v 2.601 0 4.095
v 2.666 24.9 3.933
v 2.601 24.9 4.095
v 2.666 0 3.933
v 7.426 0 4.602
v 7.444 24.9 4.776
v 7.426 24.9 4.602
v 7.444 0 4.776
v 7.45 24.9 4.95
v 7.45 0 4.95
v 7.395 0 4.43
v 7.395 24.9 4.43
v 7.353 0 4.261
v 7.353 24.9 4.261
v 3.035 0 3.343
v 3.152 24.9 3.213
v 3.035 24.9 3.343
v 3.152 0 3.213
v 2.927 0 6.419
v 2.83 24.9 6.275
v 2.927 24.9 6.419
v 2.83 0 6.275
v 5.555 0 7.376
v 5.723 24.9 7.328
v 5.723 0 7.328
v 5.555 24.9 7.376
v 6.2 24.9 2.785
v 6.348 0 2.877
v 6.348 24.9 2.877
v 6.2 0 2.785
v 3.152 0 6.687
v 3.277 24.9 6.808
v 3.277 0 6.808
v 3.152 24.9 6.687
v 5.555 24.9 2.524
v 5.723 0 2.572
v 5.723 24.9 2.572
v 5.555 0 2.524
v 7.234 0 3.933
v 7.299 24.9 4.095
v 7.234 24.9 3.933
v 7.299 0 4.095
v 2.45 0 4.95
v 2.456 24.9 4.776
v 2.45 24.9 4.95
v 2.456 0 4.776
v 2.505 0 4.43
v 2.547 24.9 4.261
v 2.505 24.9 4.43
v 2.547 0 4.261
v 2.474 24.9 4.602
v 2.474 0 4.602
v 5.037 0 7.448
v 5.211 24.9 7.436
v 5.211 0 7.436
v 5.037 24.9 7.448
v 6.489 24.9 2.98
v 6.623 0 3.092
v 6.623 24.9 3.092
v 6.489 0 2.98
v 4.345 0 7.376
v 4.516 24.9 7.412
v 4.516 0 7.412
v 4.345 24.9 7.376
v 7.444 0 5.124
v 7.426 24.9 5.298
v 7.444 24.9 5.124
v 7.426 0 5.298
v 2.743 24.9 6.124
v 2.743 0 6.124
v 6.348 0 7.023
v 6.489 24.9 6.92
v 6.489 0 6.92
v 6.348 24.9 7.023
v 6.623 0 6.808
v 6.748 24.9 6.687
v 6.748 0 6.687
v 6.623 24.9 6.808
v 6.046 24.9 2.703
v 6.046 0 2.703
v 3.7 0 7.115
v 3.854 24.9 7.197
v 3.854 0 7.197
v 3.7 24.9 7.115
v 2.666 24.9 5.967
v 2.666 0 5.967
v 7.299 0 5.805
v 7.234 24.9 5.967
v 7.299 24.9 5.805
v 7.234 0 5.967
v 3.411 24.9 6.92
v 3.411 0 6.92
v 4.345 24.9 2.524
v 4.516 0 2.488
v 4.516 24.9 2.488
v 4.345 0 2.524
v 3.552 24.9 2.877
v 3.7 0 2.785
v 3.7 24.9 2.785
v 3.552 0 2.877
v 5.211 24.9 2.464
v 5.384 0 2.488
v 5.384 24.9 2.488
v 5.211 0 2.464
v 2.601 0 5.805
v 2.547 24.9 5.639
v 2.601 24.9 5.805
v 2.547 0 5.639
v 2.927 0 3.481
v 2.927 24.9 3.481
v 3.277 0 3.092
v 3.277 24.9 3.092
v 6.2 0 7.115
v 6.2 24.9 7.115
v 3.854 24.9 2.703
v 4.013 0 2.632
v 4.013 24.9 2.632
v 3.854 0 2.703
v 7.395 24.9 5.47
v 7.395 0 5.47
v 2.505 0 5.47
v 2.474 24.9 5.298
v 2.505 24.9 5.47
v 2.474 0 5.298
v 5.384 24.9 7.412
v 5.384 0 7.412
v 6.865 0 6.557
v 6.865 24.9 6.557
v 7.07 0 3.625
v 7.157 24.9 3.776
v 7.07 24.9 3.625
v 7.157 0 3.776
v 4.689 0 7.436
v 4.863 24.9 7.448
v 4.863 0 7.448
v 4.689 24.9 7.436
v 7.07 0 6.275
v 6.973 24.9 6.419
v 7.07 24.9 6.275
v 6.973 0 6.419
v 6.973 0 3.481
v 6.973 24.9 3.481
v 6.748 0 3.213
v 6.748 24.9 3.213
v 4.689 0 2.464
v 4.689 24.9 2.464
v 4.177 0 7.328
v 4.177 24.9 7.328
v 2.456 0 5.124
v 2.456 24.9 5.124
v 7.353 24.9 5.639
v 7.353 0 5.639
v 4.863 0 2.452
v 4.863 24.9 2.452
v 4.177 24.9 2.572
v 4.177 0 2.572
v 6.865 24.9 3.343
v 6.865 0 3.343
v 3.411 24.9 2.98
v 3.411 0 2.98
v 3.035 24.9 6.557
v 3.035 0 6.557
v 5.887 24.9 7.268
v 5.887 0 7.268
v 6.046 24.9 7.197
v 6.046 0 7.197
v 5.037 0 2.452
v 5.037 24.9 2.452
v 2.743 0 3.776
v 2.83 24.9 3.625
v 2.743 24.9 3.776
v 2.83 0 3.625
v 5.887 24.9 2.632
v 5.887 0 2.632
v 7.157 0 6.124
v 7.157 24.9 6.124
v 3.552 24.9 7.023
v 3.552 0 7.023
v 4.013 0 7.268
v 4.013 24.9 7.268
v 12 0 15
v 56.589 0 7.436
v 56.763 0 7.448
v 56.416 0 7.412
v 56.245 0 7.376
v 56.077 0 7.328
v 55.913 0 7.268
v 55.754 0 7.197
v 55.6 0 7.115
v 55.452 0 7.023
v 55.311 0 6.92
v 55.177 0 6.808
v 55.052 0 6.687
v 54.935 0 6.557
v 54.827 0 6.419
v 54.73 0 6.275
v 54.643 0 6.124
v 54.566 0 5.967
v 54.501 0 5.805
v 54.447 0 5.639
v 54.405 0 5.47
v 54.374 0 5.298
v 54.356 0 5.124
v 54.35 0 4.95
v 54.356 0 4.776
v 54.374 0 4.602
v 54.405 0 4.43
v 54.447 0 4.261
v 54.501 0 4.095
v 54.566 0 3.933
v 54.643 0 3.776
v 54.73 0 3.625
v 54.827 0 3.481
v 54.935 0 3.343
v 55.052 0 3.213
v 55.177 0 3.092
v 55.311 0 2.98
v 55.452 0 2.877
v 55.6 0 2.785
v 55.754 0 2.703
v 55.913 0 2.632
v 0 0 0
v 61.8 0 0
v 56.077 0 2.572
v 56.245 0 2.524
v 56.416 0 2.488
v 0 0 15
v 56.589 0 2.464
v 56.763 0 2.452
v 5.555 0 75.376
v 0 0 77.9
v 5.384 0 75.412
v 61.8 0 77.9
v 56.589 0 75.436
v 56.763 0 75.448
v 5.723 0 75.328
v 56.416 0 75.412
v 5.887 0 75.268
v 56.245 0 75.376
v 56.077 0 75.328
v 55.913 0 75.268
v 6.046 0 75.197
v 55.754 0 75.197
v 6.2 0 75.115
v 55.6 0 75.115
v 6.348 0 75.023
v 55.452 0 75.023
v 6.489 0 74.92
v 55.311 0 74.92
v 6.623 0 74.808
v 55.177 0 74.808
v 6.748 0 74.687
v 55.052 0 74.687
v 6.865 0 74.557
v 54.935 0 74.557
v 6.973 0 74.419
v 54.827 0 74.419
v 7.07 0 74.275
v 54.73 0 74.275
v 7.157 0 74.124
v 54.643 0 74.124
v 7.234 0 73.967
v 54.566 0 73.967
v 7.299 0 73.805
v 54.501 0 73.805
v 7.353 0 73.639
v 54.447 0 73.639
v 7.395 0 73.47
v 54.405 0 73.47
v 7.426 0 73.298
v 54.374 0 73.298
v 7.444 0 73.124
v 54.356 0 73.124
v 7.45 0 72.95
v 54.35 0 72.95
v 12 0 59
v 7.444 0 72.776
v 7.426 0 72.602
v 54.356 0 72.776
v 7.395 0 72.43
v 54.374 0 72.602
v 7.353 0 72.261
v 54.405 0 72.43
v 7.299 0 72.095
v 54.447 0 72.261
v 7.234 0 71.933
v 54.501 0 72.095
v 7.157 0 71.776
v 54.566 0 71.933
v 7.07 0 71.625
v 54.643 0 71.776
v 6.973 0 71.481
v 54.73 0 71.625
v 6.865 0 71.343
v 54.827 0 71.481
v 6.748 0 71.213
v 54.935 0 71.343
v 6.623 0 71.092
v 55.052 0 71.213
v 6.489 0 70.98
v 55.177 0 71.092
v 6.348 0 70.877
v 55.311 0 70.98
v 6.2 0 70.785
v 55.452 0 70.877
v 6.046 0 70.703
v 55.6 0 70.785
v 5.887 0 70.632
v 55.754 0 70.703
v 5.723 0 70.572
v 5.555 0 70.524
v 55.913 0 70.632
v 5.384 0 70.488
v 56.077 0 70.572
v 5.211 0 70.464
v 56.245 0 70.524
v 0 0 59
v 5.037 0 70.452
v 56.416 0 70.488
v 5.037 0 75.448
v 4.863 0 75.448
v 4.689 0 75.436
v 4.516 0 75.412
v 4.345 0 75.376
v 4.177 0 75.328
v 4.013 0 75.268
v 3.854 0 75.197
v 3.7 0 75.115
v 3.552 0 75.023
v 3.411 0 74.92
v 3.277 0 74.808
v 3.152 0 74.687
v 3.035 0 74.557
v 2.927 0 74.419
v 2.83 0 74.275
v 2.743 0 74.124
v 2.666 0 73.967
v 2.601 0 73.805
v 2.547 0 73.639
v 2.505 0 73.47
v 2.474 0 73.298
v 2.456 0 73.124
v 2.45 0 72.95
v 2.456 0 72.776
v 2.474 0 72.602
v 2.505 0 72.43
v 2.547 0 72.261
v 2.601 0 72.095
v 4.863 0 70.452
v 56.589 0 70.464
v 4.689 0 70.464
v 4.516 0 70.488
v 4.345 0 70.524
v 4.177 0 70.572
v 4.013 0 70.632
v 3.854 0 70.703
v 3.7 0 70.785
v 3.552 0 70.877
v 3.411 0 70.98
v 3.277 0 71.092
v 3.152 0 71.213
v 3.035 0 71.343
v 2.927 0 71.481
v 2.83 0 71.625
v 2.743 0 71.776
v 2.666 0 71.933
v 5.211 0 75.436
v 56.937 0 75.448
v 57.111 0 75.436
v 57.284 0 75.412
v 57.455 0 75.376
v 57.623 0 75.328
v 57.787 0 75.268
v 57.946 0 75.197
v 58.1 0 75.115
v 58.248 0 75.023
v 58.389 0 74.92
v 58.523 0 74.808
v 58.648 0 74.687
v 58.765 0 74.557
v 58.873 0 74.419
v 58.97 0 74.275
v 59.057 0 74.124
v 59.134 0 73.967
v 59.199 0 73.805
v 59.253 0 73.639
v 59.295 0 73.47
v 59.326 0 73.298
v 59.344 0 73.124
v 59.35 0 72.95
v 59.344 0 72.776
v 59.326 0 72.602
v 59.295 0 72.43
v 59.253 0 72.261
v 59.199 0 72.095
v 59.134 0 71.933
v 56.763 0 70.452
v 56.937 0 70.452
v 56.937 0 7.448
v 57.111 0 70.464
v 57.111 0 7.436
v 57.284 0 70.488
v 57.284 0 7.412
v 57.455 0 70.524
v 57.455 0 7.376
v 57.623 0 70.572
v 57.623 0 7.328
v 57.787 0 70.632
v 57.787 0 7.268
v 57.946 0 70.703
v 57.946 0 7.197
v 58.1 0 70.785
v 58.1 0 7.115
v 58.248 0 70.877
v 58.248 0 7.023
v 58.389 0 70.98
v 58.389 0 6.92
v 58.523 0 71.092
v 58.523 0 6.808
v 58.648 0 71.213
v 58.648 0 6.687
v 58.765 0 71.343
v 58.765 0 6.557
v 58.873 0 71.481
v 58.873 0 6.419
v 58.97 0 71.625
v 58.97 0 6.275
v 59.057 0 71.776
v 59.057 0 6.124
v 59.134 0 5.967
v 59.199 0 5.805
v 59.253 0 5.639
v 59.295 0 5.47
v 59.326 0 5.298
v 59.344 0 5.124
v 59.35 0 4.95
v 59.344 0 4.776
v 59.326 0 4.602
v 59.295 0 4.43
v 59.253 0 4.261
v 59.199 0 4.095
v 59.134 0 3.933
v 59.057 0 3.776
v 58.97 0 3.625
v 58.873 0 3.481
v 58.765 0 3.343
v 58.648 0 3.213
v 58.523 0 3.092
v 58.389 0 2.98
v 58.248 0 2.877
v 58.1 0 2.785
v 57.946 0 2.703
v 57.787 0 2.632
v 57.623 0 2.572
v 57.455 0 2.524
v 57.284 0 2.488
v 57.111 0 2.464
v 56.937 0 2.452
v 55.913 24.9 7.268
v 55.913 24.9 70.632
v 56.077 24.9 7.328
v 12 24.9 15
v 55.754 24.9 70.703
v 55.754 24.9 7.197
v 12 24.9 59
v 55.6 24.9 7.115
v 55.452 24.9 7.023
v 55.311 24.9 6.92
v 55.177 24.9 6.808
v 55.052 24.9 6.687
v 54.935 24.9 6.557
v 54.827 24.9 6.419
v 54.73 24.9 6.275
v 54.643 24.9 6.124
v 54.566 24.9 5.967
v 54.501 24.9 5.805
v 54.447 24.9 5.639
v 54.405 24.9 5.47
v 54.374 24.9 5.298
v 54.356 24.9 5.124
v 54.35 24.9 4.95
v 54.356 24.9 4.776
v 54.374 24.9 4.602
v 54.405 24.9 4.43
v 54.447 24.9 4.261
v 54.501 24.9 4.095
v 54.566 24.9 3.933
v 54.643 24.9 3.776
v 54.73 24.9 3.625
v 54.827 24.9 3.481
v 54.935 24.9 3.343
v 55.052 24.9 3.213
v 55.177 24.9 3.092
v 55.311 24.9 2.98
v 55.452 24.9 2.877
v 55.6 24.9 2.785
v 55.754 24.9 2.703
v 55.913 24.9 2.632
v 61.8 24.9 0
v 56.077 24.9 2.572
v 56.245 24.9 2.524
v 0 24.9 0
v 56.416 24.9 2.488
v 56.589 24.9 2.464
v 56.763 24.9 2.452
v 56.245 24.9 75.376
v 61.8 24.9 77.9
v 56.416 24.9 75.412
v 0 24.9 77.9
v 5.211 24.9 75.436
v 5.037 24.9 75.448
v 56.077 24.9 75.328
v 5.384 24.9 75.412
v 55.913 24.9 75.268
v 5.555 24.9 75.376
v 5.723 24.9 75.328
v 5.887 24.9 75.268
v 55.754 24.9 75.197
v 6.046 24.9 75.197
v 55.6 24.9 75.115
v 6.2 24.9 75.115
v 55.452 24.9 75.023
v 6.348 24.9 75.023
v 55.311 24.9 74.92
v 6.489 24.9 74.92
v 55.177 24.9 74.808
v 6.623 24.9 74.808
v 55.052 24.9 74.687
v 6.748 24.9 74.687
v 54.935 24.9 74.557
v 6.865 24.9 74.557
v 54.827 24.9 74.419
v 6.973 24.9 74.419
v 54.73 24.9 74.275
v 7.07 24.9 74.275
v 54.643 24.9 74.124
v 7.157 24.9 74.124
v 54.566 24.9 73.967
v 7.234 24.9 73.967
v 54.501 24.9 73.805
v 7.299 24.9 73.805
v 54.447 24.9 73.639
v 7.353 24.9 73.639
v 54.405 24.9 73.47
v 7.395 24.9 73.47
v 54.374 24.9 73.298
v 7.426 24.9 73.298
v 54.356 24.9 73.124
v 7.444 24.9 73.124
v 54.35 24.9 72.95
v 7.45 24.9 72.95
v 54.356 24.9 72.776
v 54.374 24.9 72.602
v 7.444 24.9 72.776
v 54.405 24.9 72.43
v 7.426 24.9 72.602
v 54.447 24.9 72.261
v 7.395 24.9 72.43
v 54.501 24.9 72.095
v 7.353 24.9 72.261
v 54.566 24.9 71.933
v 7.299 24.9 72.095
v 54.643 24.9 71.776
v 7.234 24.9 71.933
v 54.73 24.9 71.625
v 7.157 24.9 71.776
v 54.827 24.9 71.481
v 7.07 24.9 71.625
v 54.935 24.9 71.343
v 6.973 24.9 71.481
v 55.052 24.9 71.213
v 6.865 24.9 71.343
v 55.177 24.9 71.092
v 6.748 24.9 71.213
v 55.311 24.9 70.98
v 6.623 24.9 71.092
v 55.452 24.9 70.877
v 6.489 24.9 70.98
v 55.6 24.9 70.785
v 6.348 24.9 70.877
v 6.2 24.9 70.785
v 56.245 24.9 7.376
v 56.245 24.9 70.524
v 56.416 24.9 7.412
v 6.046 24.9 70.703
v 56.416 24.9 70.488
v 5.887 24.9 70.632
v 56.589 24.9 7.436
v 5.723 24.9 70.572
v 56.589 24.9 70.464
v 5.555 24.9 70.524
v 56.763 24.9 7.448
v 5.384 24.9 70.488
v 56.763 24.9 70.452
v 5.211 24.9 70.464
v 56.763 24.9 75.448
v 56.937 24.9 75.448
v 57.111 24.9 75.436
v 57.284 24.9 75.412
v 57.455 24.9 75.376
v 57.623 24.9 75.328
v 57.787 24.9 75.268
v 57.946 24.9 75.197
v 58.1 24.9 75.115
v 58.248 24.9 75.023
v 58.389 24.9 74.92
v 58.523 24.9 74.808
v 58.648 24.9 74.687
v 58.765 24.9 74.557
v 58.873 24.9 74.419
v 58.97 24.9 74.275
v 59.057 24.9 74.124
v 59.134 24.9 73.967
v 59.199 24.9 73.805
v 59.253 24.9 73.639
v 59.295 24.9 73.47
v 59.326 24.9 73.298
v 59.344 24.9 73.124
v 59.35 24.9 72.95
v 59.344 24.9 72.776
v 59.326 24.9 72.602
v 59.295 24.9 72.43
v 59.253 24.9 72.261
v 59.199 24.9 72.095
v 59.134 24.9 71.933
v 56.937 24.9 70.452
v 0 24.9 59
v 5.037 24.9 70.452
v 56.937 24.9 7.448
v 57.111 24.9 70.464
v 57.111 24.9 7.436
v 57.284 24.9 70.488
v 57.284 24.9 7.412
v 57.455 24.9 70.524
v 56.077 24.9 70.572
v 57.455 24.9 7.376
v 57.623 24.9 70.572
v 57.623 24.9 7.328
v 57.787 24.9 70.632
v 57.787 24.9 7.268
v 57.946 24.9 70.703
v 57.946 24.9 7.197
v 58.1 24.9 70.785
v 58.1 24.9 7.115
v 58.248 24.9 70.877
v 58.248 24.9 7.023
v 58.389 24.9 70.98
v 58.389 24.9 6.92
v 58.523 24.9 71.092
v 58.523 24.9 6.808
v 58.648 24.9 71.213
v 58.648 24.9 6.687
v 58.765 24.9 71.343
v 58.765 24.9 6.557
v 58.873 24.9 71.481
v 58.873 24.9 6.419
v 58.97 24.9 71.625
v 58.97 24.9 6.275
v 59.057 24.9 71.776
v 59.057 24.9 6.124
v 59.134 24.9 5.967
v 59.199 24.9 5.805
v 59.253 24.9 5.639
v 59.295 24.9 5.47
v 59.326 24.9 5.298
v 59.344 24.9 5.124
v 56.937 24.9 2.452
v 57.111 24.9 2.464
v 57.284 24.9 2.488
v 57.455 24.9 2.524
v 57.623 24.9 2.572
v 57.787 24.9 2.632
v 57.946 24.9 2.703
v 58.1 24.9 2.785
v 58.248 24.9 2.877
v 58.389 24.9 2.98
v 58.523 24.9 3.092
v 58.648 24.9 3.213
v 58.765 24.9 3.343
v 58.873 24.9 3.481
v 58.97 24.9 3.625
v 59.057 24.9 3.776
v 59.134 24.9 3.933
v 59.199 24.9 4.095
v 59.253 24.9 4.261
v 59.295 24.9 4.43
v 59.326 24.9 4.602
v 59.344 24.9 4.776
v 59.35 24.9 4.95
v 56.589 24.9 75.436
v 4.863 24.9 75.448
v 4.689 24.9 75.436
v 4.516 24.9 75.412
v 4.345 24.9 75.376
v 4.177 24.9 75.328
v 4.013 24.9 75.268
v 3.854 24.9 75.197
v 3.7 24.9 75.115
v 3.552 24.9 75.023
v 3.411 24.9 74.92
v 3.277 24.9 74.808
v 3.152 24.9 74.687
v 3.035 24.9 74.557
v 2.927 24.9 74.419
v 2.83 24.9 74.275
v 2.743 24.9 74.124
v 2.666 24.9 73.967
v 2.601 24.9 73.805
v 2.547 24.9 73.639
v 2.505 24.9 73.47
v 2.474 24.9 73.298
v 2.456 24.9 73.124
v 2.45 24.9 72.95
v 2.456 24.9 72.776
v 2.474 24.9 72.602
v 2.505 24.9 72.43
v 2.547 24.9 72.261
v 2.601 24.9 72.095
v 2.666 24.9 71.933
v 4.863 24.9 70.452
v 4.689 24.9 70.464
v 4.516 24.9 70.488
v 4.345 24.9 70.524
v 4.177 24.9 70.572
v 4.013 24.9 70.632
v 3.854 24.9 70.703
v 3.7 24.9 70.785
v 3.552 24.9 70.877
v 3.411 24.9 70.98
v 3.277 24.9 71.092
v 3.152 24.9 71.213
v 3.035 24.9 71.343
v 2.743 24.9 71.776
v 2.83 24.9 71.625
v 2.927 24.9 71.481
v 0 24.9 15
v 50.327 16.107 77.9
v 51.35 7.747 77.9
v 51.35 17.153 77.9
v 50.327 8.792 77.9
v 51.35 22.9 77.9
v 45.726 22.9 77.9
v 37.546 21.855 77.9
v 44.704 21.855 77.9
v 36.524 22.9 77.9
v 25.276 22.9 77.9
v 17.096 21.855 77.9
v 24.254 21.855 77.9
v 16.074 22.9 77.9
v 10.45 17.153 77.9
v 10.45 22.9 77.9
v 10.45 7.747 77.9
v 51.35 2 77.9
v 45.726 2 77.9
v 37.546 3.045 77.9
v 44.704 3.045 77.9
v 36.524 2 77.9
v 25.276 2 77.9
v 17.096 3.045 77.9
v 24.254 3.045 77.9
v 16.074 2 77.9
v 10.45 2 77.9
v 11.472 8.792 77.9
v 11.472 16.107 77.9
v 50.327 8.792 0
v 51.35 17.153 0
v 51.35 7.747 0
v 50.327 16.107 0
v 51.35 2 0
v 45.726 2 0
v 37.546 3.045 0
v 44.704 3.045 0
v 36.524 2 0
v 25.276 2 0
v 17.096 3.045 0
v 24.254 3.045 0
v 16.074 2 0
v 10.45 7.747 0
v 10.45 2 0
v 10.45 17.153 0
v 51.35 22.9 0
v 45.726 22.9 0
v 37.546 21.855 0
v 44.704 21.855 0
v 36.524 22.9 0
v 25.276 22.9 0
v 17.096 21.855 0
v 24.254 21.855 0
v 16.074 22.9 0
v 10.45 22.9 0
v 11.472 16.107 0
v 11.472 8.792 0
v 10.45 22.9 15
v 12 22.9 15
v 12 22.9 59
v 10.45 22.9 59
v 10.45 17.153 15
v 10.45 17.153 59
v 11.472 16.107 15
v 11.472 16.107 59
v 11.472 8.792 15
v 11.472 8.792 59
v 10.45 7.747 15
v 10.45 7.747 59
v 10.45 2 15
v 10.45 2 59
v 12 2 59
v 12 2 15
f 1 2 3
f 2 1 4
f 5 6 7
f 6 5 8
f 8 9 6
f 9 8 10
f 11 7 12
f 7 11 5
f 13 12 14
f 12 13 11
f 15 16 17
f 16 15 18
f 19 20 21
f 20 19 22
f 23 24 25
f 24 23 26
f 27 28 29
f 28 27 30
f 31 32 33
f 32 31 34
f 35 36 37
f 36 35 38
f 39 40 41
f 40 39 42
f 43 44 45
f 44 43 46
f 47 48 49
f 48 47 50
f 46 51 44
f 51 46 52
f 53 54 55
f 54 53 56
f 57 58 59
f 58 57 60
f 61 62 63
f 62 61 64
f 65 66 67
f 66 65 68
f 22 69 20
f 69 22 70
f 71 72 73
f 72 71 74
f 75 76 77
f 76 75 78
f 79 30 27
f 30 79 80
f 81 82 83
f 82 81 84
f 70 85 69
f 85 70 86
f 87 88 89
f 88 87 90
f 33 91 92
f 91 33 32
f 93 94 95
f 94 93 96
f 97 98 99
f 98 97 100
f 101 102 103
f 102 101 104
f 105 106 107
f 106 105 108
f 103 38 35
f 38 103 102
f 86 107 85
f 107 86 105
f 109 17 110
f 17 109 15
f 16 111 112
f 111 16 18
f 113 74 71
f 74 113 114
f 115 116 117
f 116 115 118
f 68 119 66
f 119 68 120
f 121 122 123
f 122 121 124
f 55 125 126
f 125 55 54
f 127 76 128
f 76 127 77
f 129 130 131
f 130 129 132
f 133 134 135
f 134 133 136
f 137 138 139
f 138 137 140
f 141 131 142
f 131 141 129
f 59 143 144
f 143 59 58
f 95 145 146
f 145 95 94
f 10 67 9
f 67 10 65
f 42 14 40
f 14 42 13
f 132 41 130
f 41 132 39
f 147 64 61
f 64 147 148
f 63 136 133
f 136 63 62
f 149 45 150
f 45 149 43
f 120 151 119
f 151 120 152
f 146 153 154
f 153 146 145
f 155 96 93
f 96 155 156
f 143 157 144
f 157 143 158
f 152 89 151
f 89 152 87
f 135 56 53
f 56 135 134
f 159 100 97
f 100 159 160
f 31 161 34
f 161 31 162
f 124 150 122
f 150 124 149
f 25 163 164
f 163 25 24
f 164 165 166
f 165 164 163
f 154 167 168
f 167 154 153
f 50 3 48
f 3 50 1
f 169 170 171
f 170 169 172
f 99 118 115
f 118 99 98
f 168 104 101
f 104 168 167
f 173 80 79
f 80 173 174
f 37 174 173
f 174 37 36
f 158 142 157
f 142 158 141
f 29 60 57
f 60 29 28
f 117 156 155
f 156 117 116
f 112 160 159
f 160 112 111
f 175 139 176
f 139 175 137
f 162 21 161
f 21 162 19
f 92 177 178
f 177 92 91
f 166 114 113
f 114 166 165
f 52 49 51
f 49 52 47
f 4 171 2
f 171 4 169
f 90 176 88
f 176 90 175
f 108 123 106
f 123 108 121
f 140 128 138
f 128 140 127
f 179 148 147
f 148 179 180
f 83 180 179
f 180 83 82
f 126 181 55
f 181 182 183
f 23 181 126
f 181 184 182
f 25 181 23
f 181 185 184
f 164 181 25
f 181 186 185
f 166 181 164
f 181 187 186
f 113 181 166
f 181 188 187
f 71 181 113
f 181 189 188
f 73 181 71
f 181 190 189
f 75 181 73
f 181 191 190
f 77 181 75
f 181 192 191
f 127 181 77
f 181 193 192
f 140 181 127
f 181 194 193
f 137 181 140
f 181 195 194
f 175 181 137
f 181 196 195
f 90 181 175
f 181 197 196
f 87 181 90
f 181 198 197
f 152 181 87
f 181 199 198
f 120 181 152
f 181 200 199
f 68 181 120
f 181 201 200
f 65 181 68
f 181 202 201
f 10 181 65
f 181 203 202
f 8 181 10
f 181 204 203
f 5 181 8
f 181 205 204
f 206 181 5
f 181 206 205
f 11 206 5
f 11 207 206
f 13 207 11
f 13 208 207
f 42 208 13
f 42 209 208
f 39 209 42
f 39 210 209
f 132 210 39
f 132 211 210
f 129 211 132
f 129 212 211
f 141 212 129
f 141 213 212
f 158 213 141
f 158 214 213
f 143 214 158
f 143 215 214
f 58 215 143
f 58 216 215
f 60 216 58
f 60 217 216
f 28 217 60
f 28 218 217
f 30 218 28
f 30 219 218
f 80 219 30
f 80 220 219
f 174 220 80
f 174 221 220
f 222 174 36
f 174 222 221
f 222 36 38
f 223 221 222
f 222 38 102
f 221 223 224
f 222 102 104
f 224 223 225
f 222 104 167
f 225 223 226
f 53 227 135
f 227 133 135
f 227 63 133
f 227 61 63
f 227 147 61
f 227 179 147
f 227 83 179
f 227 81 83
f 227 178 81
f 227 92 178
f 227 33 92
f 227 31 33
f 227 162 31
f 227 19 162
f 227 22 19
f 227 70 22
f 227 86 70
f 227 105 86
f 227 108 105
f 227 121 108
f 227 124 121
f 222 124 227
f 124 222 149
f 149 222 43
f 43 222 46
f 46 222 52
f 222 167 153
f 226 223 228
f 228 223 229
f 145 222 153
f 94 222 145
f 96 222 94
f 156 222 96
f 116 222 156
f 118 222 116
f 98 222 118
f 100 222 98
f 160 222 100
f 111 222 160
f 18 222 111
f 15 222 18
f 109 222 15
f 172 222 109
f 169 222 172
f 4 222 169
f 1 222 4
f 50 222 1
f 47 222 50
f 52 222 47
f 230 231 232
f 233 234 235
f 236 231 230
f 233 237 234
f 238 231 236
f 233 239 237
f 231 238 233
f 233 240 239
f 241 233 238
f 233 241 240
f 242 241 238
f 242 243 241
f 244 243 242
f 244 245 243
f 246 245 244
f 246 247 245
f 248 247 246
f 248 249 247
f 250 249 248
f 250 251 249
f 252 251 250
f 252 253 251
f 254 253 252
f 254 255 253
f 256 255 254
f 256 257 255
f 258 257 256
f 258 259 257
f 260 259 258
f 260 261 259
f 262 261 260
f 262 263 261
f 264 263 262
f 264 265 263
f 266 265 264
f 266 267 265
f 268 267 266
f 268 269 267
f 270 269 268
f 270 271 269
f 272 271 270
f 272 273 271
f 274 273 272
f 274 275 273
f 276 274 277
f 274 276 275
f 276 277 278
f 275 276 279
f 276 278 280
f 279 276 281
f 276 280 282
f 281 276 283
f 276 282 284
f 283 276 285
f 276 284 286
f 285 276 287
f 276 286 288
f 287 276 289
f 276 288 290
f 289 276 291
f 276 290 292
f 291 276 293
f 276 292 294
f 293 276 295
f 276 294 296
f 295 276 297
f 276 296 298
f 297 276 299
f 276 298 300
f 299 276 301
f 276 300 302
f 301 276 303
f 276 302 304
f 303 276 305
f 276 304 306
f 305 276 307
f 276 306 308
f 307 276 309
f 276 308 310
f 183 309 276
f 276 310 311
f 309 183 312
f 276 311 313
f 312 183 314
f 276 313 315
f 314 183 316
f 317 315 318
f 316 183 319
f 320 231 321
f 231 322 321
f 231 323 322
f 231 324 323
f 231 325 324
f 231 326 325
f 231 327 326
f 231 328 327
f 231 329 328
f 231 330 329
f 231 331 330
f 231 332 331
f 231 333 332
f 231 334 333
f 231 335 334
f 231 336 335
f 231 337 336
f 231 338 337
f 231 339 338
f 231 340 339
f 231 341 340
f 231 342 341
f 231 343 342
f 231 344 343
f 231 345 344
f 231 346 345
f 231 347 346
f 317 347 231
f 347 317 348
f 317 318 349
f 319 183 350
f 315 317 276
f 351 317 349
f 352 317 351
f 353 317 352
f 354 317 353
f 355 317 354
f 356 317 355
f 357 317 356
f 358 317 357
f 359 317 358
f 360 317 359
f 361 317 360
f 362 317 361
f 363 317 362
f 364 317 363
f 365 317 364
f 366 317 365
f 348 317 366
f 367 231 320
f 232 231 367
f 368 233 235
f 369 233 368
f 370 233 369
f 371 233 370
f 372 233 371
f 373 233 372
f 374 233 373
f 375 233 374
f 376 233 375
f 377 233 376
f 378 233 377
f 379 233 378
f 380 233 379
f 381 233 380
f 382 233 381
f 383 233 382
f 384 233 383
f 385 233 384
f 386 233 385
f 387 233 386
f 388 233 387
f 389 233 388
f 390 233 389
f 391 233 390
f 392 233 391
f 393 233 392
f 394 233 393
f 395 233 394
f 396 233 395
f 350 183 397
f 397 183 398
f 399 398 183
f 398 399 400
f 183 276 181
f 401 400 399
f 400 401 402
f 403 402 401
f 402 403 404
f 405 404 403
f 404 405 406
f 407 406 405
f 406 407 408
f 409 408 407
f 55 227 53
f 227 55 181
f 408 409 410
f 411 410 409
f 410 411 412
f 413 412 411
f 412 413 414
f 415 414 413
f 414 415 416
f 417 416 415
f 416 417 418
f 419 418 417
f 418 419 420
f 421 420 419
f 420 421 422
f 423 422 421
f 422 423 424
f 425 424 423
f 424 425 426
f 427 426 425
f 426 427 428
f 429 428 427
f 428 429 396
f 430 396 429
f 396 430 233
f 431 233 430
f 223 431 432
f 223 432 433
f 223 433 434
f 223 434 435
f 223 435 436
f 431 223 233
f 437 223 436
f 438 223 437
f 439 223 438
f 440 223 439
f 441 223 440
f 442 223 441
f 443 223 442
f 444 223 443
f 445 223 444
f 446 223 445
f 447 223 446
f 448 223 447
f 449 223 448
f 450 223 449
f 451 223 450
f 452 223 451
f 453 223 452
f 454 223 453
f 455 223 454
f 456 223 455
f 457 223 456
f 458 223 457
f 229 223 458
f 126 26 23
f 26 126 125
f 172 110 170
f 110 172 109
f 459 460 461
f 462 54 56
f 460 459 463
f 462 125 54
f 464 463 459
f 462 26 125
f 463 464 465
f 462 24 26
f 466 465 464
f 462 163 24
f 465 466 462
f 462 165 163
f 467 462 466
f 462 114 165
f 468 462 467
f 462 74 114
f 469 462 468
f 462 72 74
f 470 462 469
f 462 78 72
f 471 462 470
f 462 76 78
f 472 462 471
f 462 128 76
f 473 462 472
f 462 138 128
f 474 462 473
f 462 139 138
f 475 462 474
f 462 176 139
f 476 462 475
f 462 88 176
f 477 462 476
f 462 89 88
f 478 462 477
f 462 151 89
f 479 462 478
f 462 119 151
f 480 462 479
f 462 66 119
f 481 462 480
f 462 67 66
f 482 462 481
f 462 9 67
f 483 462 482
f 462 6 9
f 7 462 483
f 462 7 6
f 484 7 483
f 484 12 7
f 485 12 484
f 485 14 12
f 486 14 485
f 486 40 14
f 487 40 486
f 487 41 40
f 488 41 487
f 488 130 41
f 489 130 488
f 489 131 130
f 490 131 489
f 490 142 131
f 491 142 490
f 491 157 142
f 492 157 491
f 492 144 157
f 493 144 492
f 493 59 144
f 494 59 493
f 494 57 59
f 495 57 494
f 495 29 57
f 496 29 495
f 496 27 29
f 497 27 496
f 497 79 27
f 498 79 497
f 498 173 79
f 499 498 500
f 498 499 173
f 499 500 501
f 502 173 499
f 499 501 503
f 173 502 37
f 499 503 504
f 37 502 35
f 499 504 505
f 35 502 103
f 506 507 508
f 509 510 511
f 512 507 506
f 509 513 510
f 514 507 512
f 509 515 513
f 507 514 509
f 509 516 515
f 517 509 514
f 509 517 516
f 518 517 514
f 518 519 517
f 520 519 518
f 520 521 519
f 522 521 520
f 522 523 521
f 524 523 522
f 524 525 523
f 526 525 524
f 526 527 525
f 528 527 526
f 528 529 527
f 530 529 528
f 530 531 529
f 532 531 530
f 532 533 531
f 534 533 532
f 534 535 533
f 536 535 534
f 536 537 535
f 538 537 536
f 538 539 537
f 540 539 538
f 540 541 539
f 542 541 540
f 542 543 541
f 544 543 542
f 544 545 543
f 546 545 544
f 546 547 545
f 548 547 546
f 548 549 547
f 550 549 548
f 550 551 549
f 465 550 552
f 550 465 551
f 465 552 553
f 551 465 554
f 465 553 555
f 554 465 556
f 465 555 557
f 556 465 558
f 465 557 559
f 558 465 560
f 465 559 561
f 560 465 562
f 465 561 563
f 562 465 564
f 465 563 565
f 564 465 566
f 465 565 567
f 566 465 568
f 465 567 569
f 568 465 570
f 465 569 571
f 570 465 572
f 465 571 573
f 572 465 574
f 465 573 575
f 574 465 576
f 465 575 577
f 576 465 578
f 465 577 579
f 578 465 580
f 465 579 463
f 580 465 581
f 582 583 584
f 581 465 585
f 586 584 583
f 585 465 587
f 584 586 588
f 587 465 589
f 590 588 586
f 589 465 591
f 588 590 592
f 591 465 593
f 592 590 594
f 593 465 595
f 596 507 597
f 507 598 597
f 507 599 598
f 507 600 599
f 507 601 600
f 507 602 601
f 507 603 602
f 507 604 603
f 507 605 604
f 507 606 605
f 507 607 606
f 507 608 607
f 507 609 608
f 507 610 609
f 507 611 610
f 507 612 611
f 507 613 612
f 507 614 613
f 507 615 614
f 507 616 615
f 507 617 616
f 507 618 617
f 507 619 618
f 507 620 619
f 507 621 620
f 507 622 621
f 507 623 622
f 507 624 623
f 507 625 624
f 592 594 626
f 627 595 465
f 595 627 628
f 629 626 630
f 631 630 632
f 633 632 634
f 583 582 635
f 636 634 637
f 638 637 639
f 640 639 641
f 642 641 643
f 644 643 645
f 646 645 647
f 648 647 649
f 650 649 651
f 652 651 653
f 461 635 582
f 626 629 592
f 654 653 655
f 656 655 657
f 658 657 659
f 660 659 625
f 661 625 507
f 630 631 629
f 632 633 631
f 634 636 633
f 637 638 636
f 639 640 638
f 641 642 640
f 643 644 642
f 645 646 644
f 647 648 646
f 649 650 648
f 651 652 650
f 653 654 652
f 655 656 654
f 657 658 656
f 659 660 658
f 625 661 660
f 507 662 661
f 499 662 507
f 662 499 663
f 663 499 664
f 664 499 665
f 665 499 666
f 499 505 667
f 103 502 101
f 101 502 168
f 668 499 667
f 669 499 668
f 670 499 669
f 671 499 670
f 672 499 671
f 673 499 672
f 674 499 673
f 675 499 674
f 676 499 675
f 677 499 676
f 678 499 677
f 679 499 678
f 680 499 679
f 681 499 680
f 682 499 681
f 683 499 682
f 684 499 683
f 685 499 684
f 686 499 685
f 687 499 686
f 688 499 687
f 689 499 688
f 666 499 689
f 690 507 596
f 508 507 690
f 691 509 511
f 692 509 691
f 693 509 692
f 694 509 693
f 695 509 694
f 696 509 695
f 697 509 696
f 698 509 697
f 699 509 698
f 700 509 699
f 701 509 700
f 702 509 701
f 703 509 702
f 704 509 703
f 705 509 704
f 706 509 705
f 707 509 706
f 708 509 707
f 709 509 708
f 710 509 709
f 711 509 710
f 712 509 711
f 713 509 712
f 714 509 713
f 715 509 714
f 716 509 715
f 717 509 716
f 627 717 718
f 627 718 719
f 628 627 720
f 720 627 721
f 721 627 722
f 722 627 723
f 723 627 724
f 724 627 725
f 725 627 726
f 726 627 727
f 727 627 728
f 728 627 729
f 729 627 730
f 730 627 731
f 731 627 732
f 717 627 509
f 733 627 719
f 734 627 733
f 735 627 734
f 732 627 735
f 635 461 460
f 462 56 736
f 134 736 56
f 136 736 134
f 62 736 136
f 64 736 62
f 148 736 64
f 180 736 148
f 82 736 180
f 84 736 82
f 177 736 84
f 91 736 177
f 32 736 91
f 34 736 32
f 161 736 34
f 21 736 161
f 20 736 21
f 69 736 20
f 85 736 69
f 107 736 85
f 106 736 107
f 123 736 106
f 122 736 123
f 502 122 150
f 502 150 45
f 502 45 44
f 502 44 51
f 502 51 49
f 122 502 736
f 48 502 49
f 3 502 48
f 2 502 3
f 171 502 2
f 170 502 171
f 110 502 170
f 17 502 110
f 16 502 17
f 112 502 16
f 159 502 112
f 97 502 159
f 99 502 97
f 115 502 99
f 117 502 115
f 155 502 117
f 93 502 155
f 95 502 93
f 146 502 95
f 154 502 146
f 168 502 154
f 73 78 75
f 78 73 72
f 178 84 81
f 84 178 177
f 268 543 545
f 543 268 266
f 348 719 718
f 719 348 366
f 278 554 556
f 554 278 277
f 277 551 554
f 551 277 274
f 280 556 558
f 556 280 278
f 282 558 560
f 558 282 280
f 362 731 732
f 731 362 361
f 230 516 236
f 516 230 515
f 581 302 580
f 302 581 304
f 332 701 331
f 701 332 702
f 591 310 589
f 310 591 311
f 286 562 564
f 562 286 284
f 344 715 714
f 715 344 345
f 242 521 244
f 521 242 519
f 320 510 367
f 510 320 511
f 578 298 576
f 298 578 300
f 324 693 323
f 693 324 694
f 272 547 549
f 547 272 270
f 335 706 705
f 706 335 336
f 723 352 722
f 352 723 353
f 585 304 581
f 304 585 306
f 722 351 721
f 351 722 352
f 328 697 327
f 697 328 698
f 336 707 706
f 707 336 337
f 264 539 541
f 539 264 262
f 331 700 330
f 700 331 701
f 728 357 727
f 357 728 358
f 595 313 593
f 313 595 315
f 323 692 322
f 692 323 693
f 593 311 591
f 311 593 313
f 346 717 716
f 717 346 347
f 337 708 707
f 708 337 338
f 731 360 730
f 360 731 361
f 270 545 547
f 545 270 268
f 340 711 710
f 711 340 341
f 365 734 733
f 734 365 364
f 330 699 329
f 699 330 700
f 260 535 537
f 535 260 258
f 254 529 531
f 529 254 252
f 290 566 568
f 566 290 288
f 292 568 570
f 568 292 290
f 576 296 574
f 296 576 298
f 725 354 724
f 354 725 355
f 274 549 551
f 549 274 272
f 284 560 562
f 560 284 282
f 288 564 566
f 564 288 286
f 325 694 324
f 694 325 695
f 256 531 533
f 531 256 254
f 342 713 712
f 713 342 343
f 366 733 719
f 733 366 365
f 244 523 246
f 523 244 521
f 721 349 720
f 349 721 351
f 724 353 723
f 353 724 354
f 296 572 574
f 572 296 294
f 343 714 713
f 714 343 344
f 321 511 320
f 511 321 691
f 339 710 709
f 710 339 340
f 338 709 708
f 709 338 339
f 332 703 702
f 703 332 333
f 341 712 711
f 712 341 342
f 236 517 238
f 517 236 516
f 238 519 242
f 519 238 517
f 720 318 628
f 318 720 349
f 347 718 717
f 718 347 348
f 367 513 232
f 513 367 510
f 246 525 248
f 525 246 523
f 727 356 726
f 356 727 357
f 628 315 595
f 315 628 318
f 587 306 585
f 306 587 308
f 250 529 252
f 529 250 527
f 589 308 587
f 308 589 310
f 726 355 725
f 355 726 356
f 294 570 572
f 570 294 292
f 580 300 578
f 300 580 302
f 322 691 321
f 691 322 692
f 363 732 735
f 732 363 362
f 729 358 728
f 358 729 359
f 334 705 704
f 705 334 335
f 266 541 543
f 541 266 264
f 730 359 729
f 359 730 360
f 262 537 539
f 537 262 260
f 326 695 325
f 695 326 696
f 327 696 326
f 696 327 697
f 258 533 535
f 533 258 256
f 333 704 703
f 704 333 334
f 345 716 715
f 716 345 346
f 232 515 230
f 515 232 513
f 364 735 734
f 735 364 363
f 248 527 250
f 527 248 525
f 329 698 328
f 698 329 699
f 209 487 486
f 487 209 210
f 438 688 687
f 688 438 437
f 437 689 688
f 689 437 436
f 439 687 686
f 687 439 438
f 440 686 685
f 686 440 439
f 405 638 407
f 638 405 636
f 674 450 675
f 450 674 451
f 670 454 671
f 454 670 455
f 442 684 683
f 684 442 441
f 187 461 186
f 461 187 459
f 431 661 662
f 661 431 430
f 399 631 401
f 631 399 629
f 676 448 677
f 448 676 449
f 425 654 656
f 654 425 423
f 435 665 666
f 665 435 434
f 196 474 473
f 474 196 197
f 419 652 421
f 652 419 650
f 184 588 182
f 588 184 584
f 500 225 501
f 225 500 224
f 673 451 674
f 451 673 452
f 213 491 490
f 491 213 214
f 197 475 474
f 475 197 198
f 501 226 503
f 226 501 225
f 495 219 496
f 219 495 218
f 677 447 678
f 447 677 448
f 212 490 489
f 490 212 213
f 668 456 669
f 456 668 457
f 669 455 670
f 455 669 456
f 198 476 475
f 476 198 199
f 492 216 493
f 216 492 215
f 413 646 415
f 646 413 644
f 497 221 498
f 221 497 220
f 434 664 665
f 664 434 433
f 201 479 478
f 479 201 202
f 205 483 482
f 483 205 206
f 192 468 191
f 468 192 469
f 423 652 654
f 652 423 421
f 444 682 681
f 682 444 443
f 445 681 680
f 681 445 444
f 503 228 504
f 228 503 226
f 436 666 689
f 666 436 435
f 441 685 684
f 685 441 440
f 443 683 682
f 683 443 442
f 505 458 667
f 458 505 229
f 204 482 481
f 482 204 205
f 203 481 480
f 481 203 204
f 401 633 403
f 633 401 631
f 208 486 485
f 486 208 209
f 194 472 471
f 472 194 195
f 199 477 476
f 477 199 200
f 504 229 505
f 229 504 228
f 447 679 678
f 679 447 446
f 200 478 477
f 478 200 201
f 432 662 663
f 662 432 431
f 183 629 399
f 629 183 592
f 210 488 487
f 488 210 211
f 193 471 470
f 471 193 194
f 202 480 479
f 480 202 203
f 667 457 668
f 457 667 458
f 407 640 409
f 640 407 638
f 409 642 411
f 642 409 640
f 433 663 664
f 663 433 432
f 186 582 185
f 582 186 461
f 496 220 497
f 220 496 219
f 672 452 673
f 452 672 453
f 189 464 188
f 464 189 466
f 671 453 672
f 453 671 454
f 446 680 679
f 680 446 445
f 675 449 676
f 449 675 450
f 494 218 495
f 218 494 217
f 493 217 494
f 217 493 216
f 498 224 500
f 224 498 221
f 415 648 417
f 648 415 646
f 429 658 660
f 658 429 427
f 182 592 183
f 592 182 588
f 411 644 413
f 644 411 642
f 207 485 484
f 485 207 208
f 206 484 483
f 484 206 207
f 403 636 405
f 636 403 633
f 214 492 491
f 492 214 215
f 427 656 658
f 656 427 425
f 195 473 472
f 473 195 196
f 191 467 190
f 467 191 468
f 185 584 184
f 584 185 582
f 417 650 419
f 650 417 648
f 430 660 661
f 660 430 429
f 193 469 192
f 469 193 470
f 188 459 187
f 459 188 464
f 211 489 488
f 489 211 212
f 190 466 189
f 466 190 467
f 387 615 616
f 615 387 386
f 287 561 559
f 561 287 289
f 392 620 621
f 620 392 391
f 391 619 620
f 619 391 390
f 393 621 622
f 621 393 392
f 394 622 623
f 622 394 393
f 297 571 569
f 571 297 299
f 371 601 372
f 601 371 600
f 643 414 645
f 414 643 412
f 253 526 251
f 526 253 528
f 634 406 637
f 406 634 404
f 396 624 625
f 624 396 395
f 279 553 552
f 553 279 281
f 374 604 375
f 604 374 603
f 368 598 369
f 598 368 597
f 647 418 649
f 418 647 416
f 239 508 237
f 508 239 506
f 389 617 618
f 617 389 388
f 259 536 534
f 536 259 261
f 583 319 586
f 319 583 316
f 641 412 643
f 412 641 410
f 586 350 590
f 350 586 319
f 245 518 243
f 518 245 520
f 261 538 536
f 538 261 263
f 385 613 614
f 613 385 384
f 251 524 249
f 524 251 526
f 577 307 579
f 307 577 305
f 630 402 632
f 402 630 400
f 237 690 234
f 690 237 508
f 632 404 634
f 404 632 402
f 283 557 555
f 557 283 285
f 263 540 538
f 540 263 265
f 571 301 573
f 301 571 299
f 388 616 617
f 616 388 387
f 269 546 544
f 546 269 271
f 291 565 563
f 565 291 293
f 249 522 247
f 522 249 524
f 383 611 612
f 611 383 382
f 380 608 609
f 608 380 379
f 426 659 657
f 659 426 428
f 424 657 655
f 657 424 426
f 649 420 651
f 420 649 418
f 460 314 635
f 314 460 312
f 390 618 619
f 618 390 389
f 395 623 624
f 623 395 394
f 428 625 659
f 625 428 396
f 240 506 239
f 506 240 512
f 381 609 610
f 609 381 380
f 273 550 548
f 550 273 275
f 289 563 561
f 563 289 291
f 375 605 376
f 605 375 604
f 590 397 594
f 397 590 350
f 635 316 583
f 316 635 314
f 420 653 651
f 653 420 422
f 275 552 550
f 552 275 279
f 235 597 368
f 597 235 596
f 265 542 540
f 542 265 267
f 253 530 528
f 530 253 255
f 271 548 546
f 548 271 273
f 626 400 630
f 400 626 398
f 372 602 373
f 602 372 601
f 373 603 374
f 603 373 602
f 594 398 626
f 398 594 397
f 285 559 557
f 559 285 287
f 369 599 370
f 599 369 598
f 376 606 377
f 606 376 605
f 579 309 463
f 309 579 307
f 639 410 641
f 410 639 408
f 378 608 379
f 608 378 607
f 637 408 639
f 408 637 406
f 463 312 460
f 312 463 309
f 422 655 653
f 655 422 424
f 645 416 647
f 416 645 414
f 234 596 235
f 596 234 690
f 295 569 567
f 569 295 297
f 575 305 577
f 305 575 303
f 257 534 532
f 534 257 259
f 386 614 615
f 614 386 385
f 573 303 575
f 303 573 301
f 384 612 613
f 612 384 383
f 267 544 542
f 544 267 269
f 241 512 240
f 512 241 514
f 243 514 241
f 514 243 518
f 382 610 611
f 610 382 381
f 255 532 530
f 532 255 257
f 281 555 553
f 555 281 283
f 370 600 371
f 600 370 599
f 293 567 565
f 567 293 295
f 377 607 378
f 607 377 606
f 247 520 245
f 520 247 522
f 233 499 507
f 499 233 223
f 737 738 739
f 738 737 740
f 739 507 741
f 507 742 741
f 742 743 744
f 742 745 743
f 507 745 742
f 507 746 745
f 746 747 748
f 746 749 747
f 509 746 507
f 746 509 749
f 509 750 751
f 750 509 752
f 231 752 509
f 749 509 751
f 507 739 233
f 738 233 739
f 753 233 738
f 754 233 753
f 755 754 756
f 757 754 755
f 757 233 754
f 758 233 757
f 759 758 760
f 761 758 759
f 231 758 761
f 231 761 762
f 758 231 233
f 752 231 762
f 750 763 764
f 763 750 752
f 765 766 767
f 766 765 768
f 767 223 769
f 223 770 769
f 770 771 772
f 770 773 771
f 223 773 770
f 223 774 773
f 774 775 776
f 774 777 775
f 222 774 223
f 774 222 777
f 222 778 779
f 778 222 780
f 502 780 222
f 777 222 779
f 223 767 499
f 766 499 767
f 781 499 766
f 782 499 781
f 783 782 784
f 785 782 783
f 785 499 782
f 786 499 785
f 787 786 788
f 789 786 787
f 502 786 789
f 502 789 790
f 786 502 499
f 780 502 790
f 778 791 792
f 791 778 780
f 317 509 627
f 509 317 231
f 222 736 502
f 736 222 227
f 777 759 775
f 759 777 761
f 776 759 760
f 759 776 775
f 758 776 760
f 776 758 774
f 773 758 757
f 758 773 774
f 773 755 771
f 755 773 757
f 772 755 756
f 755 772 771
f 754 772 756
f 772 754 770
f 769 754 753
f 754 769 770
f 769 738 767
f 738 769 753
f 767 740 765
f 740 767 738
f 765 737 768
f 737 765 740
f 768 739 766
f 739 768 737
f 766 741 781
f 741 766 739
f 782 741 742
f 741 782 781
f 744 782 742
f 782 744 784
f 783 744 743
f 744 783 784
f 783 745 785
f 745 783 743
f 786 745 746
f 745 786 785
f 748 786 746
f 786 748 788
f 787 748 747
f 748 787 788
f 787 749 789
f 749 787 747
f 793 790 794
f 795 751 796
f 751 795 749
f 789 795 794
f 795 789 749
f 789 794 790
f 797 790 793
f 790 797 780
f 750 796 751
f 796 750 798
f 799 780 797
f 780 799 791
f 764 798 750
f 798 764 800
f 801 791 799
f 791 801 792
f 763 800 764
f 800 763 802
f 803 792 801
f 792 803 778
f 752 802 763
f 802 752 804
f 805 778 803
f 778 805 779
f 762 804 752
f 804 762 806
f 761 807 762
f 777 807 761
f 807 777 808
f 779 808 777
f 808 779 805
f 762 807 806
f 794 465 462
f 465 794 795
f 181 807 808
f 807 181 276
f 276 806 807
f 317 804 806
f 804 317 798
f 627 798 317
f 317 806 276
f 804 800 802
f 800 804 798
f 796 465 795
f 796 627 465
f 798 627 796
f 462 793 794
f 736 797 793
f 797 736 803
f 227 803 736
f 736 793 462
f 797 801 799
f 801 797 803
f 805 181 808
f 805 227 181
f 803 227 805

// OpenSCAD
// file: constants.scad
tolerance=0.7;
oversize = 0.7;
lengthHoleSpacing=20;
wallWidth=5;
vslotIndentHeight=1;
sectionWidth=20;
profileSize=20;
sectionCountWidth = 2;
sectionCountDepth = 1;
extrusionWidth=profileSize*sectionCountWidth;
extrusionDepth=profileSize*sectionCountDepth;
nema17Width = 42.3;
nema17HoleRadius = 11.05 + tolerance/2;
nema17Height = 3.5*extrusionWidth;
nema17BoltSpacing = 31;
nema17BeltHoleHeight = 8;
nema17BeltOffsetFromTopExtrusion = 8;
nema17BeltHeightWidth = 15;
wallSpacing=5;
screwHeight = wallSpacing+vslotIndentHeight;
// main file
use <vslot.scad>;

sectionCountWidth=2;
sectionCountDepth=1;
screwDiameter=5;
tolerance=.9;
wallWidth=2 + tolerance/2;
profileSize=20;
sideNum = 1;

holeDistWidth=68;
holeDistHeight=51.9;
allTogether = true;
blockHeight = wallWidth*2 + sectionCountWidth*profileSize;
blockWidth = wallWidth*2 + sectionCountDepth*profileSize;
cubeX = holeDistHeight+screwDiameter+2*wallWidth;
cubeZ = holeDistWidth+screwDiameter+2*wallWidth;

mirror([sideNum == 1 ? 0 : 1, 0, 0])
difference() {
    cube([cubeX,blockWidth,cubeZ]);
    translate([wallWidth+screwDiameter/2, 0, wallWidth+screwDiameter/2])
    {
        rotate([-90,0,0])
            cylinder(r=screwDiameter/2,h=blockWidth, $fn=90);
        translate([0, 0, holeDistWidth])
            rotate([-90,0,0])
            cylinder(r=screwDiameter/2,h=blockWidth, $fn=90);
    }
    translate([wallWidth+screwDiameter/2 + holeDistHeight, 0, wallWidth+screwDiameter/2])
    {
        rotate([-90,0,0])
            cylinder(r=screwDiameter/2,h=blockWidth, $fn=90);
        translate([0, 0, holeDistWidth])
            rotate([-90,0,0])
            cylinder(r=screwDiameter/2,h=blockWidth, $fn=90);
    }
    translate([(cubeX-(sectionCountWidth*profileSize))/2,wallWidth,0])
        drawVslotExtrusion(
            height=cubeZ,
            sectionCountWidth=sectionCountWidth, 
            sectionCountDepth=sectionCountDepth, 
            topIndent=true, 
            rightIndent=true, 
            leftIndent=true, 
            bottomIndent=true, 
            oversize=tolerance
            //screwOffset,
            //leftScrewPoints = [],
            //rightScrewPoints = [],
            //topScrewPoints = [],
            //bottomScrewPoints = [],
            //backScrewPoints = []
    );
    translate([0,0,15])
        cube([12,blockWidth,44]);
    if (!allTogether) {
        translate ([sideNum == 1 ? 0 : cubeX, 0, 0])
        mirror([sideNum == 1 ? 0 : 1, 0, 0]) {
            linear_extrude(h=cubeZ) 
                polygon(points=[
                    [0,wallWidth-tolerance/2], 
                    [(cubeX-(sectionCountWidth*profileSize))/2-tolerance/2,wallWidth-tolerance/2],
                    [cubeX-(cubeX-(sectionCountWidth*profileSize))/2+tolerance/2,blockWidth-wallWidth+tolerance/2],
                    [cubeX+tolerance/2, blockWidth-wallWidth+tolerance/2],
                    [cubeX+tolerance/2, blockWidth+tolerance/2],
                    [0, blockWidth]
                ]);
        }
    }
    /*
    translate([-(holeDistHeight-blockHeight)/2+holeDistHeight, 0, cylinderRadius])
        rotate([-90,0,0])
        cylinder(r=cylinderRadius,h=blockWidth, $fn=90);
    translate([-(holeDistHeight-blockHeight)/2+holeDistHeight, 0, cylinderRadius+holeDistWidth])
        rotate([-90,0,0])
        cylinder(r=cylinderRadius,h=blockWidth, $fn=90);
    */
}
